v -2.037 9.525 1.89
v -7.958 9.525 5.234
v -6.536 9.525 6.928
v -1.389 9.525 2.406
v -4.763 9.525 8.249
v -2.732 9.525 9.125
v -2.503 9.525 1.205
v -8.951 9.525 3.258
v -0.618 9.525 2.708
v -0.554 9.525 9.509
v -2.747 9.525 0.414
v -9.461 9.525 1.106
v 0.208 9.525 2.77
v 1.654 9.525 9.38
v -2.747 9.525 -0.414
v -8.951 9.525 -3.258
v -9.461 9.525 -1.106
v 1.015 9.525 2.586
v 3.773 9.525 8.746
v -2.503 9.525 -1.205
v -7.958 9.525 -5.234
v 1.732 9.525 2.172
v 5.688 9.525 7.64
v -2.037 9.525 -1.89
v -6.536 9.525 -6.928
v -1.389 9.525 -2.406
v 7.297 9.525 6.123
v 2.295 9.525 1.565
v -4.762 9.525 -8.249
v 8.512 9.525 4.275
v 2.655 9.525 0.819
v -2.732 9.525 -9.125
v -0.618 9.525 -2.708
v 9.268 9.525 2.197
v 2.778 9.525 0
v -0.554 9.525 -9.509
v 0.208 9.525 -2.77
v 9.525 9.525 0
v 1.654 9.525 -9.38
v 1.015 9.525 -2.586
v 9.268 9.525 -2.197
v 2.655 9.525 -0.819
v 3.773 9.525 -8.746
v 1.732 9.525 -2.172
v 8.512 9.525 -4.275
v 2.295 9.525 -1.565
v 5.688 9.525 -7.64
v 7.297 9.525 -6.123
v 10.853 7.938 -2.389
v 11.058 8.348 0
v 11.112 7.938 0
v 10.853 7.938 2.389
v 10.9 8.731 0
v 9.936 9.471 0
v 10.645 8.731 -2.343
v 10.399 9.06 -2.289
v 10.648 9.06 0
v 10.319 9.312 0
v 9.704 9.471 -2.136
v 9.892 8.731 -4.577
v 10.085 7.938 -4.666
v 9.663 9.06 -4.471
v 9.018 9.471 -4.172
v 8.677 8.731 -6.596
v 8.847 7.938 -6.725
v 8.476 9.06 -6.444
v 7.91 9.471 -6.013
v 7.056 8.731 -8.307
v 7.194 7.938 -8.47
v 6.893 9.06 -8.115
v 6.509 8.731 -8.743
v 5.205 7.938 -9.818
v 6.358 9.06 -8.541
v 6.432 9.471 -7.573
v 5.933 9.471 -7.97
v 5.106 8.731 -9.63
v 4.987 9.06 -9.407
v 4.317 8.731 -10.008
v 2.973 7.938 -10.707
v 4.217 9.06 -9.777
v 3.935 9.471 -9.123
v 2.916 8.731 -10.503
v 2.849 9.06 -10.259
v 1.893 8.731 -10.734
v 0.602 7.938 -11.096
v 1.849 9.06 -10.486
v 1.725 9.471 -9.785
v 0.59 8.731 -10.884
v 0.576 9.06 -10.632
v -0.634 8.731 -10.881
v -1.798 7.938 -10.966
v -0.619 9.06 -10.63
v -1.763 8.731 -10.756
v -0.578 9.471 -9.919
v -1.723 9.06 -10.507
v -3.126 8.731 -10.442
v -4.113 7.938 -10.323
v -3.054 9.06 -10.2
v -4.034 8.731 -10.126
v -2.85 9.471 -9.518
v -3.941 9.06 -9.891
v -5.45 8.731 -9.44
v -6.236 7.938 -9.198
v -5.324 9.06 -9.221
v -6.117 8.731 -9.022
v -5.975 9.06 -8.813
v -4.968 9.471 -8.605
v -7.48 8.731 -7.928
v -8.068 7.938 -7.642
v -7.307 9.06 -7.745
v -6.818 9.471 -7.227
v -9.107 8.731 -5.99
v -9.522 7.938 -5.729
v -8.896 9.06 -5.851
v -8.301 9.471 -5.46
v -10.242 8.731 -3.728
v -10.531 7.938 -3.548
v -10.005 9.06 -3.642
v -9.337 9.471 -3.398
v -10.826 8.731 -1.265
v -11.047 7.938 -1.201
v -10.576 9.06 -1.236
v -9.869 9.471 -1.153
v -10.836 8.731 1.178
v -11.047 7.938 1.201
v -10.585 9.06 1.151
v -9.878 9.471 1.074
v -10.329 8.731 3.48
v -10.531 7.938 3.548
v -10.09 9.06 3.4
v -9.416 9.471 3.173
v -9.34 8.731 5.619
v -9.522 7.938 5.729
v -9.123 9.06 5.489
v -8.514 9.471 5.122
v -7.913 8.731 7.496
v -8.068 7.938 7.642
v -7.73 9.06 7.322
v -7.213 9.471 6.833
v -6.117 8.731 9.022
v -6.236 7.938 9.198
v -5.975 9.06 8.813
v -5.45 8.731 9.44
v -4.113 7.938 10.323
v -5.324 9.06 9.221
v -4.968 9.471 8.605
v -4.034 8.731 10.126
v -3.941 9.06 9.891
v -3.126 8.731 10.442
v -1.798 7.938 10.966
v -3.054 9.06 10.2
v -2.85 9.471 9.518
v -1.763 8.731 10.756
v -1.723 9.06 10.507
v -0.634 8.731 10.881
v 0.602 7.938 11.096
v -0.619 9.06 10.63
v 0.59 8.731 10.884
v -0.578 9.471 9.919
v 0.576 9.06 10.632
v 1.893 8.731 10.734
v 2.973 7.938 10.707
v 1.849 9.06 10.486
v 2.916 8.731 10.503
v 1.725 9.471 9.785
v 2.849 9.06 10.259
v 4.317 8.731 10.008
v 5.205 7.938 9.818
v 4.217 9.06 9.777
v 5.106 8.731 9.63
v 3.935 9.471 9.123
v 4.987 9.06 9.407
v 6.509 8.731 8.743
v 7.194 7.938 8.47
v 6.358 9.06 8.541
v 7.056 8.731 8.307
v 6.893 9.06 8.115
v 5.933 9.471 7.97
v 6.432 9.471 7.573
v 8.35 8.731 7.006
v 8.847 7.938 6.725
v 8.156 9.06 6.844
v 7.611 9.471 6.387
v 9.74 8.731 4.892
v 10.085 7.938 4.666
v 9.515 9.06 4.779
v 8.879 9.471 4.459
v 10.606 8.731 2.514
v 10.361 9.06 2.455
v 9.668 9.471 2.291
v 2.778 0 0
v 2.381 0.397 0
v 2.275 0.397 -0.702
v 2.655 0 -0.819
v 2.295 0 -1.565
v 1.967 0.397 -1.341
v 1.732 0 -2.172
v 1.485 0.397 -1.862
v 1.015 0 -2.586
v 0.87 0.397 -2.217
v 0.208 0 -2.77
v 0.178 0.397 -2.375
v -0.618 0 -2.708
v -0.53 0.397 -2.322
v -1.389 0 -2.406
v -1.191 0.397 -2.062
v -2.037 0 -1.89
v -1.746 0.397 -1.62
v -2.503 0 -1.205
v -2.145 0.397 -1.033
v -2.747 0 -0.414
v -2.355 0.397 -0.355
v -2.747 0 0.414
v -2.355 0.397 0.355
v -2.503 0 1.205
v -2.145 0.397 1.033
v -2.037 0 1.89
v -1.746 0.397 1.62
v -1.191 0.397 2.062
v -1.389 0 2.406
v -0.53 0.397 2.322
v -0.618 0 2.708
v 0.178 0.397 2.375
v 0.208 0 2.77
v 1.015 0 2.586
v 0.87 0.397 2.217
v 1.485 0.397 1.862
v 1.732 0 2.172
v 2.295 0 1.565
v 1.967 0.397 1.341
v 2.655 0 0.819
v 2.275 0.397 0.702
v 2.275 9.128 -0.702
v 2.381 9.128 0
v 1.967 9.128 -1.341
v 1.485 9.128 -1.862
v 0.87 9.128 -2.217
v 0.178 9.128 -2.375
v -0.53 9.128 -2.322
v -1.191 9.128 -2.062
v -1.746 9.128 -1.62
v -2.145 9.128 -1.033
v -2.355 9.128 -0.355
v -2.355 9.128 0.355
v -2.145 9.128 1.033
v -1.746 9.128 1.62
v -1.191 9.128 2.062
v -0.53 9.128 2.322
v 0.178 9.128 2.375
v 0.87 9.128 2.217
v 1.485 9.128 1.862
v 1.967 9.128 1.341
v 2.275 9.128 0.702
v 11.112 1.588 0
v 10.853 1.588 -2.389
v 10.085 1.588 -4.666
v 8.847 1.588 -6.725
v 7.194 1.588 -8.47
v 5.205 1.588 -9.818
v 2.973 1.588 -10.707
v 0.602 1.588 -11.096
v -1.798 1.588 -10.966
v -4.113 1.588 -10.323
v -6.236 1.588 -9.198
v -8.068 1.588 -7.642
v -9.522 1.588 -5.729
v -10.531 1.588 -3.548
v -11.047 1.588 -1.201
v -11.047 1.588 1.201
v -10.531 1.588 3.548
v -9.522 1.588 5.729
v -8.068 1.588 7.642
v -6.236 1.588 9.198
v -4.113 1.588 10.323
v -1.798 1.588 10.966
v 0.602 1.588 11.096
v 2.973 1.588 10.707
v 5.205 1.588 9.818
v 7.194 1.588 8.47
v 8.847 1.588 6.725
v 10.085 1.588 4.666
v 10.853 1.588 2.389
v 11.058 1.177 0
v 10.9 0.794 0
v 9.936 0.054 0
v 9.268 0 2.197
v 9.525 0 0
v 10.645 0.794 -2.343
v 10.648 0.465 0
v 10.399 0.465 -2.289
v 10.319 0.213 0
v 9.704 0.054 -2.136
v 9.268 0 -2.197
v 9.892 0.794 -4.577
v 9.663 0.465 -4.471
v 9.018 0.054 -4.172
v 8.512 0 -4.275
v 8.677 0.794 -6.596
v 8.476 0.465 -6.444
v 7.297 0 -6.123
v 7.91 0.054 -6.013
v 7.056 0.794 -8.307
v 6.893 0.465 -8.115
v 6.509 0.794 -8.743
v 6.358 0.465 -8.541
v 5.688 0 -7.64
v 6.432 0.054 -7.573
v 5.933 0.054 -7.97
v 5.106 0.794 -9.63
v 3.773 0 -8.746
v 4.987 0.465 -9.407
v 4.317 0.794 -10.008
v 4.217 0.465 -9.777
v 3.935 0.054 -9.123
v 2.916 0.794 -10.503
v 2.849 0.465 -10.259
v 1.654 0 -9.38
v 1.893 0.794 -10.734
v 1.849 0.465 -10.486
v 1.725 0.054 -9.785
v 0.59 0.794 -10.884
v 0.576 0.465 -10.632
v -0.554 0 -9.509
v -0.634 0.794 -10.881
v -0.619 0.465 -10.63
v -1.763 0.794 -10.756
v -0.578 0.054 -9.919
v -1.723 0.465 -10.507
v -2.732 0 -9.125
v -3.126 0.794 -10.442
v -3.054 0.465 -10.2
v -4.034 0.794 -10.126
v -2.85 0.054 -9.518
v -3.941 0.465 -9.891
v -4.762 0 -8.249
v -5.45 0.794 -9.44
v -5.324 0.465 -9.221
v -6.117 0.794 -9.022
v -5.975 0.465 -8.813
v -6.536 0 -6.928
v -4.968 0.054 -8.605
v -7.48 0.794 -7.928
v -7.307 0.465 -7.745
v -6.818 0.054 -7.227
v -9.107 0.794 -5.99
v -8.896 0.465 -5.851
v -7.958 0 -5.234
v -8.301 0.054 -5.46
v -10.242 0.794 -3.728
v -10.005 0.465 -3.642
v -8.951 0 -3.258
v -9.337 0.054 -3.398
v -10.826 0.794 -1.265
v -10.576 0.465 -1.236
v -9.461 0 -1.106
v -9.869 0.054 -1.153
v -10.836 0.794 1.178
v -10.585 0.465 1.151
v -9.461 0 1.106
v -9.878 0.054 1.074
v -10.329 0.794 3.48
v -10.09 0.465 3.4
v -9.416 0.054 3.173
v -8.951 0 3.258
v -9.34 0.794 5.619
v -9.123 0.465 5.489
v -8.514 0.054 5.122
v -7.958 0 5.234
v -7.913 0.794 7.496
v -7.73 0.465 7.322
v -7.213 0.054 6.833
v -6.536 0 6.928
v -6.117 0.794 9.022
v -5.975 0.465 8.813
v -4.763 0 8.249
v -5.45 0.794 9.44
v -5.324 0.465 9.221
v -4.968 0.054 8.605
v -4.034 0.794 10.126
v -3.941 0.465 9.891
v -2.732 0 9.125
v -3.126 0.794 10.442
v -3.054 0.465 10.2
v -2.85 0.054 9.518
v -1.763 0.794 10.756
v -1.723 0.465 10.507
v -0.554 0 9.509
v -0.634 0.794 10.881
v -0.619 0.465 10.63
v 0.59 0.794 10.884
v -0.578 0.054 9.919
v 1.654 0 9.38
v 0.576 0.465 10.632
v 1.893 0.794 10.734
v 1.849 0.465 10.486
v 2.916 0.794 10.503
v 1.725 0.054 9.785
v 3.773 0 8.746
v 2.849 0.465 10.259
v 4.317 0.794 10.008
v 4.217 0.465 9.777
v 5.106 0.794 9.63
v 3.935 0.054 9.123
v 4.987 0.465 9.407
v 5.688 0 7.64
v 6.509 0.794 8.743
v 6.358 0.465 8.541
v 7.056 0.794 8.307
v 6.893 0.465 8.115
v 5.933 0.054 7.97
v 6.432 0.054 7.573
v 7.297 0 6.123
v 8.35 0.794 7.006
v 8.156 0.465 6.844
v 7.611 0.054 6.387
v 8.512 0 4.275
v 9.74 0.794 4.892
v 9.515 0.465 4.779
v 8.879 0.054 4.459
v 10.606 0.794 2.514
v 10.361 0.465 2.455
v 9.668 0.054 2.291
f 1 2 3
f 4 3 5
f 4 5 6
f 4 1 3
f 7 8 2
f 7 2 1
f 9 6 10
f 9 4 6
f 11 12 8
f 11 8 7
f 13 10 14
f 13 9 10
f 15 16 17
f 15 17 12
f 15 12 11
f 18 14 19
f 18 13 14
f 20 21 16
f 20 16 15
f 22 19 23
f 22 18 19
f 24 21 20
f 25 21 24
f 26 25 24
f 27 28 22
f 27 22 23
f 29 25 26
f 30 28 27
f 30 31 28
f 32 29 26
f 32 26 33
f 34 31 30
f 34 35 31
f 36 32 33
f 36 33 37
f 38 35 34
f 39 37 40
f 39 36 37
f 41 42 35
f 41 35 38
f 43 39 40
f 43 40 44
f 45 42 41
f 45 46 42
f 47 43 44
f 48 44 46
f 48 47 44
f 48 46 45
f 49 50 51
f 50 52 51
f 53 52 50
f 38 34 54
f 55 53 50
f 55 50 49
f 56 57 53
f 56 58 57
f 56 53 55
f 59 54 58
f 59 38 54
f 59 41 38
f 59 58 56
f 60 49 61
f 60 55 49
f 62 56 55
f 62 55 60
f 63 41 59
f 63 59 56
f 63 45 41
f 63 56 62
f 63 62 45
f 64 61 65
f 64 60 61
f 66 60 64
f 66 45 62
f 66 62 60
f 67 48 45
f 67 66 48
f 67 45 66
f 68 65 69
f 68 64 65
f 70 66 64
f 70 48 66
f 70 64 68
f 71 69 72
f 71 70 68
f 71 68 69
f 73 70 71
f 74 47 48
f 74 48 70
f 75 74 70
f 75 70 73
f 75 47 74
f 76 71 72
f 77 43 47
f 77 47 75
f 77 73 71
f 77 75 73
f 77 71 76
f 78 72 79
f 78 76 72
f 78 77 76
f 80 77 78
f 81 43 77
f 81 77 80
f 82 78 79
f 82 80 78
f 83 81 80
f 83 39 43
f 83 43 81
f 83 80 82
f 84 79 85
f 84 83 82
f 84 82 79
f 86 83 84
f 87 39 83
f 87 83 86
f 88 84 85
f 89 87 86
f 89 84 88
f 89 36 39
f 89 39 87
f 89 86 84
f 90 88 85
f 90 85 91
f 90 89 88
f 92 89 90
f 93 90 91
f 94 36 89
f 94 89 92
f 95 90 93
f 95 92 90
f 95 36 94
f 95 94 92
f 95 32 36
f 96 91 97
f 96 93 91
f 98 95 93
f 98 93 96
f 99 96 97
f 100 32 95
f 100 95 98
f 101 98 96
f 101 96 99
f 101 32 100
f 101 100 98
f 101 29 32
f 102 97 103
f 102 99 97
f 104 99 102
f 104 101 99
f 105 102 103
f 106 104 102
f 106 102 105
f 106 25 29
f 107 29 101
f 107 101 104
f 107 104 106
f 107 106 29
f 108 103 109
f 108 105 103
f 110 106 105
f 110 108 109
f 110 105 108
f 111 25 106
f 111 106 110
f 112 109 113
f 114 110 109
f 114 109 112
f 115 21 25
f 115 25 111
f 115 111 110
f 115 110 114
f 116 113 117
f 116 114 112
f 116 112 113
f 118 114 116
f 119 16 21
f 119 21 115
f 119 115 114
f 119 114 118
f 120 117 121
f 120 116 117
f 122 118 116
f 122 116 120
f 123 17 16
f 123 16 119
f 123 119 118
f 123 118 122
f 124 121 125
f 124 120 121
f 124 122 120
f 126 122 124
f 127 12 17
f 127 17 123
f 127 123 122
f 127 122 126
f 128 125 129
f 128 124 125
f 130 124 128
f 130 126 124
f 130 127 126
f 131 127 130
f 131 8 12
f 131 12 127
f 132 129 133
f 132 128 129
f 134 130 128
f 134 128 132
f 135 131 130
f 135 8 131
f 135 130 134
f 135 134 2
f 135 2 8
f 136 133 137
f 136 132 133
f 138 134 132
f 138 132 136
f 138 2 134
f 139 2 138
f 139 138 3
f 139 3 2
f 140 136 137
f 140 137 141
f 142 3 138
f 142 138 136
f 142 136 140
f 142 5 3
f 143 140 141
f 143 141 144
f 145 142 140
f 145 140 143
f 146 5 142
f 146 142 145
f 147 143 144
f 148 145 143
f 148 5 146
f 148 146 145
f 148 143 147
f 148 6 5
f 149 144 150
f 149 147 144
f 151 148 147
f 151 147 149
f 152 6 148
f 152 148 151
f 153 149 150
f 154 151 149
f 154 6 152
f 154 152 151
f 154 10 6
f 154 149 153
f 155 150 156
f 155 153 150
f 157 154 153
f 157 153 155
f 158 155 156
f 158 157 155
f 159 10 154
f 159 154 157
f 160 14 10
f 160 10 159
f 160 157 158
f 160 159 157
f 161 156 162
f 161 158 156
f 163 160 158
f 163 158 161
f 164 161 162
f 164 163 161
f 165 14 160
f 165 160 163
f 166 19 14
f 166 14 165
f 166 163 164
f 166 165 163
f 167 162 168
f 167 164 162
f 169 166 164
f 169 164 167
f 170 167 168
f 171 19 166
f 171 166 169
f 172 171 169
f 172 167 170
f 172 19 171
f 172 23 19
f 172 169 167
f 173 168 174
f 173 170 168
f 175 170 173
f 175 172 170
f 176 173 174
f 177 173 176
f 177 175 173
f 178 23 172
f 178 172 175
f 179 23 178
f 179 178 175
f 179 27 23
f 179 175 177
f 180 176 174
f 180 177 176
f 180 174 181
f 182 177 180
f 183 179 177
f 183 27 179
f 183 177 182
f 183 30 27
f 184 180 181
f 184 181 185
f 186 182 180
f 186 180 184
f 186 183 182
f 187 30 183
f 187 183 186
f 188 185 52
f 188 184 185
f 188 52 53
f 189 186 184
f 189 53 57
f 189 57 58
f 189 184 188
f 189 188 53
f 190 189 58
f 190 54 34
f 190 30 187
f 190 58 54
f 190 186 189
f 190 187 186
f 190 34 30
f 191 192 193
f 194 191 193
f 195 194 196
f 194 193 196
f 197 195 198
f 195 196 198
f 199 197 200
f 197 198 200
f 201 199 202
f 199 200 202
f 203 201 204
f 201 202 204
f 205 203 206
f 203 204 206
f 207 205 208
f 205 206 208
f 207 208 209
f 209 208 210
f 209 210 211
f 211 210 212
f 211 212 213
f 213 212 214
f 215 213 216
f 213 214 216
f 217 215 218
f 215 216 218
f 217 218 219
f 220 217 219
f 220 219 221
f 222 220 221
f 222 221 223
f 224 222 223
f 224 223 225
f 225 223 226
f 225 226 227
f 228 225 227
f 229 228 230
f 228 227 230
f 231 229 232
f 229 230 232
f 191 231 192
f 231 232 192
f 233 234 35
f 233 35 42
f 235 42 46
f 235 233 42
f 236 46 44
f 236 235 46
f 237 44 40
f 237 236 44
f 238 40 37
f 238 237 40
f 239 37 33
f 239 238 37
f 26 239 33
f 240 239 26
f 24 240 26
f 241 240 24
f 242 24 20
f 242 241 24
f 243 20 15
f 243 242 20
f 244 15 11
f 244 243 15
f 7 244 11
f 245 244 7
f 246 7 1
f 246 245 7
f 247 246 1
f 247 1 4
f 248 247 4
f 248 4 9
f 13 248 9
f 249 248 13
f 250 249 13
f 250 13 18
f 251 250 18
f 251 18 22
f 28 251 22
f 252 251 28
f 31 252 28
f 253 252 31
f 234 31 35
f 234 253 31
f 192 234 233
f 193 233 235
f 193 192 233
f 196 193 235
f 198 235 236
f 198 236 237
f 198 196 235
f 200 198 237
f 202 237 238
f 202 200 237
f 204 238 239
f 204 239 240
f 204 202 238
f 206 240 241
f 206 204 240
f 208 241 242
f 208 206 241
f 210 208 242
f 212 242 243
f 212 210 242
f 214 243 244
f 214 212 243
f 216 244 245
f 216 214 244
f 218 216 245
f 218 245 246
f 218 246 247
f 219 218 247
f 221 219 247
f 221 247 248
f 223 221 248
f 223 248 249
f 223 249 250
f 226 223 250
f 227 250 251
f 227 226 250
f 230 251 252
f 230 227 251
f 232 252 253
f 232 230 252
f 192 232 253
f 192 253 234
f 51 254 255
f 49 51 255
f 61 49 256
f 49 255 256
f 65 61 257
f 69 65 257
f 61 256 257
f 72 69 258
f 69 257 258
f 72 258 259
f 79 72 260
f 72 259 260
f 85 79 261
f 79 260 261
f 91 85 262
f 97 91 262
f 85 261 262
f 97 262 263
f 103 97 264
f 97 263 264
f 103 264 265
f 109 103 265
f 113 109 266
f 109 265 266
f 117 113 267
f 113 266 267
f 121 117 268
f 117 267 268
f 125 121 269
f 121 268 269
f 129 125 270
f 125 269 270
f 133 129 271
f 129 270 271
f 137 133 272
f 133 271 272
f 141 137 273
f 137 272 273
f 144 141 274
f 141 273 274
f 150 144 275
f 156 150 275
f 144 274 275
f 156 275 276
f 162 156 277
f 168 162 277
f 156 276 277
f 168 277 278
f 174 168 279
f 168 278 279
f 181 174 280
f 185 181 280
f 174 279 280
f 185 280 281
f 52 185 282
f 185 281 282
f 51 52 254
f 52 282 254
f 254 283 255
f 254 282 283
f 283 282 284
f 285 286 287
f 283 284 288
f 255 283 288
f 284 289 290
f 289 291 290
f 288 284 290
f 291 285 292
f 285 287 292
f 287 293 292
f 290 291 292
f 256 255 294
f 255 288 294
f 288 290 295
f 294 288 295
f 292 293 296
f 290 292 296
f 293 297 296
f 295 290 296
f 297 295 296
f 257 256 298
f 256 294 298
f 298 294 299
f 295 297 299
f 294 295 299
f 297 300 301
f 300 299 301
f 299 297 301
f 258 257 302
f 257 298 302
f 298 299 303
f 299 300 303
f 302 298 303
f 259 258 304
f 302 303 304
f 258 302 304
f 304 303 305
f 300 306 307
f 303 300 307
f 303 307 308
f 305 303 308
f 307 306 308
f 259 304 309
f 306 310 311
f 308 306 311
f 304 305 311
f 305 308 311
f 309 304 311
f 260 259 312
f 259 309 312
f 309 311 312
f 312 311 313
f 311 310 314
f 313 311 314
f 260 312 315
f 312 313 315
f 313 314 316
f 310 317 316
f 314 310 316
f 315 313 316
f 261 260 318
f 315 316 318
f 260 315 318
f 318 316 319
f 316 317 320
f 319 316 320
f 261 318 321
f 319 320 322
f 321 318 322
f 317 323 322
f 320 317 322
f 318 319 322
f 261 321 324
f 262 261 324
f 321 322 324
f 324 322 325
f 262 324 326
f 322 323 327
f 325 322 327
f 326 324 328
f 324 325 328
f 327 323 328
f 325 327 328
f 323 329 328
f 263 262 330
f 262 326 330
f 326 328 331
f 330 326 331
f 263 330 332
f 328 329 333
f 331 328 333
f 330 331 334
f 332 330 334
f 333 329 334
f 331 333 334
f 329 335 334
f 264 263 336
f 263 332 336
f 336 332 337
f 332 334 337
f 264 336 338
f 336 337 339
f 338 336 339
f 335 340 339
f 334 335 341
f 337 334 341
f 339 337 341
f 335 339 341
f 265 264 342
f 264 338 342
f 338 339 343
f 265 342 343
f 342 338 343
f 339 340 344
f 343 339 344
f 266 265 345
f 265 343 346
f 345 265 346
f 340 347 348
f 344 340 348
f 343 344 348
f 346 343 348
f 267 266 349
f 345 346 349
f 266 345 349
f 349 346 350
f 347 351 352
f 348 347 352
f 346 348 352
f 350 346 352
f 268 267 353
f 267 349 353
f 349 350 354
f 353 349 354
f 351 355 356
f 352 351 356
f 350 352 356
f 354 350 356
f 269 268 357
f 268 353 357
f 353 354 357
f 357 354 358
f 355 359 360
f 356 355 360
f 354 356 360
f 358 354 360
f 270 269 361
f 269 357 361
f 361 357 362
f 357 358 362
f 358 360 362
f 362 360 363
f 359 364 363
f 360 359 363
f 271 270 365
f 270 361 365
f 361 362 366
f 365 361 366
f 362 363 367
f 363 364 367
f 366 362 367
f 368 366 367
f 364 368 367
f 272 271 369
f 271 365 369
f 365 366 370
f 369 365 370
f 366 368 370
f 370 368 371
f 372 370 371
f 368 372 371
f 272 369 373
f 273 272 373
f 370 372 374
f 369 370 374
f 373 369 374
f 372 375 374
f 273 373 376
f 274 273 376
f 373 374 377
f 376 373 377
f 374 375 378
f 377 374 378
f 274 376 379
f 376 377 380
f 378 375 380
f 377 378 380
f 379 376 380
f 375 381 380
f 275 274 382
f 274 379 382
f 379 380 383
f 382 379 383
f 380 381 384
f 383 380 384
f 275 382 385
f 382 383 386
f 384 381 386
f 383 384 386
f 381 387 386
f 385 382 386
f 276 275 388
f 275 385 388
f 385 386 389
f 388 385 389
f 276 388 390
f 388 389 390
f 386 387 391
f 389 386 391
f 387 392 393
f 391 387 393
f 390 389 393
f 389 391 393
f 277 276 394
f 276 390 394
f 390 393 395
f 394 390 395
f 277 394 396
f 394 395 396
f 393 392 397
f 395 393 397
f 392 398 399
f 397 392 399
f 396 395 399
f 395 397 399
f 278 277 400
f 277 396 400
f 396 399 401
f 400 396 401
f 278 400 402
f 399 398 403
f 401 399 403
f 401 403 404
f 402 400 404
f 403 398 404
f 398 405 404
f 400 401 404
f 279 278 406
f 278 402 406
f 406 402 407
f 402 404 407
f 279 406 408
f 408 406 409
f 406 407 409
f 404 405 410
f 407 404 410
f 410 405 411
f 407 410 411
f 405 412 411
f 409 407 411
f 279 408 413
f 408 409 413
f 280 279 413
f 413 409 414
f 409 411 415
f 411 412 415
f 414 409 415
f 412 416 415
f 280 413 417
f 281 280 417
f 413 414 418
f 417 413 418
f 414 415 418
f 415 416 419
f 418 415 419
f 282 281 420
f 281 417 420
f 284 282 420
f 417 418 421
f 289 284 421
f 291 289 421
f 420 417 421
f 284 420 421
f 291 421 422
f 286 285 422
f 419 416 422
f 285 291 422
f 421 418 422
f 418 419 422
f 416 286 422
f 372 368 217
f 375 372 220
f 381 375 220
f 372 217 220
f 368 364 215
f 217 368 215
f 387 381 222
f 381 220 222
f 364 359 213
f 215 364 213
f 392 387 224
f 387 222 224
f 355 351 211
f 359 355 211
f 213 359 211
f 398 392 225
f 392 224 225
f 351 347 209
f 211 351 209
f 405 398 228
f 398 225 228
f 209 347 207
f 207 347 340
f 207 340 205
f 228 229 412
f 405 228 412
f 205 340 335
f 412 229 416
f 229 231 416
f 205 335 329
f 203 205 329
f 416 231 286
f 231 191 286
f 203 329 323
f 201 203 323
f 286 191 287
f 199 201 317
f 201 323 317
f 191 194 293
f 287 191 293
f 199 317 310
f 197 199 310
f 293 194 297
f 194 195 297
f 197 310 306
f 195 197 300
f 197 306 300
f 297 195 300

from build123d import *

# Parameters (mm, degrees)
SKETCH1_R           = 11.1125
SKETCH1_R_2         = 2.38125
BOSS_EXTRUDE1_DEPTH = 9.525
FILLET2_R           = 1.5875
CHAMFER2_SIZE       = 0.396875


with BuildPart() as part:
    # Sketch1 → Boss-Extrude1 (new body)
    with BuildSketch(Plane(origin=(0, 0, 0), x_dir=(1, 0, 0), z_dir=(0, 1, 0))):
        Circle(SKETCH1_R)
        Circle(SKETCH1_R_2, mode=Mode.SUBTRACT)
    extrude(amount=BOSS_EXTRUDE1_DEPTH)

    # Fillet2
    fillet2_edges = [part.edges().sort_by_distance(p)[0] for p in [
        (-11.1125, 0, 0),
        (-11.1125, 9.525, 0),
    ]]
    fillet(fillet2_edges, radius=FILLET2_R)

    # Chamfer2
    chamfer2_edges = [part.edges().sort_by_distance(p)[0] for p in [
        (-2.38125, 0, 0),
        (-2.38125, 9.525, 0),
    ]]
    chamfer(chamfer2_edges, length=CHAMFER2_SIZE)


solid = part.part
